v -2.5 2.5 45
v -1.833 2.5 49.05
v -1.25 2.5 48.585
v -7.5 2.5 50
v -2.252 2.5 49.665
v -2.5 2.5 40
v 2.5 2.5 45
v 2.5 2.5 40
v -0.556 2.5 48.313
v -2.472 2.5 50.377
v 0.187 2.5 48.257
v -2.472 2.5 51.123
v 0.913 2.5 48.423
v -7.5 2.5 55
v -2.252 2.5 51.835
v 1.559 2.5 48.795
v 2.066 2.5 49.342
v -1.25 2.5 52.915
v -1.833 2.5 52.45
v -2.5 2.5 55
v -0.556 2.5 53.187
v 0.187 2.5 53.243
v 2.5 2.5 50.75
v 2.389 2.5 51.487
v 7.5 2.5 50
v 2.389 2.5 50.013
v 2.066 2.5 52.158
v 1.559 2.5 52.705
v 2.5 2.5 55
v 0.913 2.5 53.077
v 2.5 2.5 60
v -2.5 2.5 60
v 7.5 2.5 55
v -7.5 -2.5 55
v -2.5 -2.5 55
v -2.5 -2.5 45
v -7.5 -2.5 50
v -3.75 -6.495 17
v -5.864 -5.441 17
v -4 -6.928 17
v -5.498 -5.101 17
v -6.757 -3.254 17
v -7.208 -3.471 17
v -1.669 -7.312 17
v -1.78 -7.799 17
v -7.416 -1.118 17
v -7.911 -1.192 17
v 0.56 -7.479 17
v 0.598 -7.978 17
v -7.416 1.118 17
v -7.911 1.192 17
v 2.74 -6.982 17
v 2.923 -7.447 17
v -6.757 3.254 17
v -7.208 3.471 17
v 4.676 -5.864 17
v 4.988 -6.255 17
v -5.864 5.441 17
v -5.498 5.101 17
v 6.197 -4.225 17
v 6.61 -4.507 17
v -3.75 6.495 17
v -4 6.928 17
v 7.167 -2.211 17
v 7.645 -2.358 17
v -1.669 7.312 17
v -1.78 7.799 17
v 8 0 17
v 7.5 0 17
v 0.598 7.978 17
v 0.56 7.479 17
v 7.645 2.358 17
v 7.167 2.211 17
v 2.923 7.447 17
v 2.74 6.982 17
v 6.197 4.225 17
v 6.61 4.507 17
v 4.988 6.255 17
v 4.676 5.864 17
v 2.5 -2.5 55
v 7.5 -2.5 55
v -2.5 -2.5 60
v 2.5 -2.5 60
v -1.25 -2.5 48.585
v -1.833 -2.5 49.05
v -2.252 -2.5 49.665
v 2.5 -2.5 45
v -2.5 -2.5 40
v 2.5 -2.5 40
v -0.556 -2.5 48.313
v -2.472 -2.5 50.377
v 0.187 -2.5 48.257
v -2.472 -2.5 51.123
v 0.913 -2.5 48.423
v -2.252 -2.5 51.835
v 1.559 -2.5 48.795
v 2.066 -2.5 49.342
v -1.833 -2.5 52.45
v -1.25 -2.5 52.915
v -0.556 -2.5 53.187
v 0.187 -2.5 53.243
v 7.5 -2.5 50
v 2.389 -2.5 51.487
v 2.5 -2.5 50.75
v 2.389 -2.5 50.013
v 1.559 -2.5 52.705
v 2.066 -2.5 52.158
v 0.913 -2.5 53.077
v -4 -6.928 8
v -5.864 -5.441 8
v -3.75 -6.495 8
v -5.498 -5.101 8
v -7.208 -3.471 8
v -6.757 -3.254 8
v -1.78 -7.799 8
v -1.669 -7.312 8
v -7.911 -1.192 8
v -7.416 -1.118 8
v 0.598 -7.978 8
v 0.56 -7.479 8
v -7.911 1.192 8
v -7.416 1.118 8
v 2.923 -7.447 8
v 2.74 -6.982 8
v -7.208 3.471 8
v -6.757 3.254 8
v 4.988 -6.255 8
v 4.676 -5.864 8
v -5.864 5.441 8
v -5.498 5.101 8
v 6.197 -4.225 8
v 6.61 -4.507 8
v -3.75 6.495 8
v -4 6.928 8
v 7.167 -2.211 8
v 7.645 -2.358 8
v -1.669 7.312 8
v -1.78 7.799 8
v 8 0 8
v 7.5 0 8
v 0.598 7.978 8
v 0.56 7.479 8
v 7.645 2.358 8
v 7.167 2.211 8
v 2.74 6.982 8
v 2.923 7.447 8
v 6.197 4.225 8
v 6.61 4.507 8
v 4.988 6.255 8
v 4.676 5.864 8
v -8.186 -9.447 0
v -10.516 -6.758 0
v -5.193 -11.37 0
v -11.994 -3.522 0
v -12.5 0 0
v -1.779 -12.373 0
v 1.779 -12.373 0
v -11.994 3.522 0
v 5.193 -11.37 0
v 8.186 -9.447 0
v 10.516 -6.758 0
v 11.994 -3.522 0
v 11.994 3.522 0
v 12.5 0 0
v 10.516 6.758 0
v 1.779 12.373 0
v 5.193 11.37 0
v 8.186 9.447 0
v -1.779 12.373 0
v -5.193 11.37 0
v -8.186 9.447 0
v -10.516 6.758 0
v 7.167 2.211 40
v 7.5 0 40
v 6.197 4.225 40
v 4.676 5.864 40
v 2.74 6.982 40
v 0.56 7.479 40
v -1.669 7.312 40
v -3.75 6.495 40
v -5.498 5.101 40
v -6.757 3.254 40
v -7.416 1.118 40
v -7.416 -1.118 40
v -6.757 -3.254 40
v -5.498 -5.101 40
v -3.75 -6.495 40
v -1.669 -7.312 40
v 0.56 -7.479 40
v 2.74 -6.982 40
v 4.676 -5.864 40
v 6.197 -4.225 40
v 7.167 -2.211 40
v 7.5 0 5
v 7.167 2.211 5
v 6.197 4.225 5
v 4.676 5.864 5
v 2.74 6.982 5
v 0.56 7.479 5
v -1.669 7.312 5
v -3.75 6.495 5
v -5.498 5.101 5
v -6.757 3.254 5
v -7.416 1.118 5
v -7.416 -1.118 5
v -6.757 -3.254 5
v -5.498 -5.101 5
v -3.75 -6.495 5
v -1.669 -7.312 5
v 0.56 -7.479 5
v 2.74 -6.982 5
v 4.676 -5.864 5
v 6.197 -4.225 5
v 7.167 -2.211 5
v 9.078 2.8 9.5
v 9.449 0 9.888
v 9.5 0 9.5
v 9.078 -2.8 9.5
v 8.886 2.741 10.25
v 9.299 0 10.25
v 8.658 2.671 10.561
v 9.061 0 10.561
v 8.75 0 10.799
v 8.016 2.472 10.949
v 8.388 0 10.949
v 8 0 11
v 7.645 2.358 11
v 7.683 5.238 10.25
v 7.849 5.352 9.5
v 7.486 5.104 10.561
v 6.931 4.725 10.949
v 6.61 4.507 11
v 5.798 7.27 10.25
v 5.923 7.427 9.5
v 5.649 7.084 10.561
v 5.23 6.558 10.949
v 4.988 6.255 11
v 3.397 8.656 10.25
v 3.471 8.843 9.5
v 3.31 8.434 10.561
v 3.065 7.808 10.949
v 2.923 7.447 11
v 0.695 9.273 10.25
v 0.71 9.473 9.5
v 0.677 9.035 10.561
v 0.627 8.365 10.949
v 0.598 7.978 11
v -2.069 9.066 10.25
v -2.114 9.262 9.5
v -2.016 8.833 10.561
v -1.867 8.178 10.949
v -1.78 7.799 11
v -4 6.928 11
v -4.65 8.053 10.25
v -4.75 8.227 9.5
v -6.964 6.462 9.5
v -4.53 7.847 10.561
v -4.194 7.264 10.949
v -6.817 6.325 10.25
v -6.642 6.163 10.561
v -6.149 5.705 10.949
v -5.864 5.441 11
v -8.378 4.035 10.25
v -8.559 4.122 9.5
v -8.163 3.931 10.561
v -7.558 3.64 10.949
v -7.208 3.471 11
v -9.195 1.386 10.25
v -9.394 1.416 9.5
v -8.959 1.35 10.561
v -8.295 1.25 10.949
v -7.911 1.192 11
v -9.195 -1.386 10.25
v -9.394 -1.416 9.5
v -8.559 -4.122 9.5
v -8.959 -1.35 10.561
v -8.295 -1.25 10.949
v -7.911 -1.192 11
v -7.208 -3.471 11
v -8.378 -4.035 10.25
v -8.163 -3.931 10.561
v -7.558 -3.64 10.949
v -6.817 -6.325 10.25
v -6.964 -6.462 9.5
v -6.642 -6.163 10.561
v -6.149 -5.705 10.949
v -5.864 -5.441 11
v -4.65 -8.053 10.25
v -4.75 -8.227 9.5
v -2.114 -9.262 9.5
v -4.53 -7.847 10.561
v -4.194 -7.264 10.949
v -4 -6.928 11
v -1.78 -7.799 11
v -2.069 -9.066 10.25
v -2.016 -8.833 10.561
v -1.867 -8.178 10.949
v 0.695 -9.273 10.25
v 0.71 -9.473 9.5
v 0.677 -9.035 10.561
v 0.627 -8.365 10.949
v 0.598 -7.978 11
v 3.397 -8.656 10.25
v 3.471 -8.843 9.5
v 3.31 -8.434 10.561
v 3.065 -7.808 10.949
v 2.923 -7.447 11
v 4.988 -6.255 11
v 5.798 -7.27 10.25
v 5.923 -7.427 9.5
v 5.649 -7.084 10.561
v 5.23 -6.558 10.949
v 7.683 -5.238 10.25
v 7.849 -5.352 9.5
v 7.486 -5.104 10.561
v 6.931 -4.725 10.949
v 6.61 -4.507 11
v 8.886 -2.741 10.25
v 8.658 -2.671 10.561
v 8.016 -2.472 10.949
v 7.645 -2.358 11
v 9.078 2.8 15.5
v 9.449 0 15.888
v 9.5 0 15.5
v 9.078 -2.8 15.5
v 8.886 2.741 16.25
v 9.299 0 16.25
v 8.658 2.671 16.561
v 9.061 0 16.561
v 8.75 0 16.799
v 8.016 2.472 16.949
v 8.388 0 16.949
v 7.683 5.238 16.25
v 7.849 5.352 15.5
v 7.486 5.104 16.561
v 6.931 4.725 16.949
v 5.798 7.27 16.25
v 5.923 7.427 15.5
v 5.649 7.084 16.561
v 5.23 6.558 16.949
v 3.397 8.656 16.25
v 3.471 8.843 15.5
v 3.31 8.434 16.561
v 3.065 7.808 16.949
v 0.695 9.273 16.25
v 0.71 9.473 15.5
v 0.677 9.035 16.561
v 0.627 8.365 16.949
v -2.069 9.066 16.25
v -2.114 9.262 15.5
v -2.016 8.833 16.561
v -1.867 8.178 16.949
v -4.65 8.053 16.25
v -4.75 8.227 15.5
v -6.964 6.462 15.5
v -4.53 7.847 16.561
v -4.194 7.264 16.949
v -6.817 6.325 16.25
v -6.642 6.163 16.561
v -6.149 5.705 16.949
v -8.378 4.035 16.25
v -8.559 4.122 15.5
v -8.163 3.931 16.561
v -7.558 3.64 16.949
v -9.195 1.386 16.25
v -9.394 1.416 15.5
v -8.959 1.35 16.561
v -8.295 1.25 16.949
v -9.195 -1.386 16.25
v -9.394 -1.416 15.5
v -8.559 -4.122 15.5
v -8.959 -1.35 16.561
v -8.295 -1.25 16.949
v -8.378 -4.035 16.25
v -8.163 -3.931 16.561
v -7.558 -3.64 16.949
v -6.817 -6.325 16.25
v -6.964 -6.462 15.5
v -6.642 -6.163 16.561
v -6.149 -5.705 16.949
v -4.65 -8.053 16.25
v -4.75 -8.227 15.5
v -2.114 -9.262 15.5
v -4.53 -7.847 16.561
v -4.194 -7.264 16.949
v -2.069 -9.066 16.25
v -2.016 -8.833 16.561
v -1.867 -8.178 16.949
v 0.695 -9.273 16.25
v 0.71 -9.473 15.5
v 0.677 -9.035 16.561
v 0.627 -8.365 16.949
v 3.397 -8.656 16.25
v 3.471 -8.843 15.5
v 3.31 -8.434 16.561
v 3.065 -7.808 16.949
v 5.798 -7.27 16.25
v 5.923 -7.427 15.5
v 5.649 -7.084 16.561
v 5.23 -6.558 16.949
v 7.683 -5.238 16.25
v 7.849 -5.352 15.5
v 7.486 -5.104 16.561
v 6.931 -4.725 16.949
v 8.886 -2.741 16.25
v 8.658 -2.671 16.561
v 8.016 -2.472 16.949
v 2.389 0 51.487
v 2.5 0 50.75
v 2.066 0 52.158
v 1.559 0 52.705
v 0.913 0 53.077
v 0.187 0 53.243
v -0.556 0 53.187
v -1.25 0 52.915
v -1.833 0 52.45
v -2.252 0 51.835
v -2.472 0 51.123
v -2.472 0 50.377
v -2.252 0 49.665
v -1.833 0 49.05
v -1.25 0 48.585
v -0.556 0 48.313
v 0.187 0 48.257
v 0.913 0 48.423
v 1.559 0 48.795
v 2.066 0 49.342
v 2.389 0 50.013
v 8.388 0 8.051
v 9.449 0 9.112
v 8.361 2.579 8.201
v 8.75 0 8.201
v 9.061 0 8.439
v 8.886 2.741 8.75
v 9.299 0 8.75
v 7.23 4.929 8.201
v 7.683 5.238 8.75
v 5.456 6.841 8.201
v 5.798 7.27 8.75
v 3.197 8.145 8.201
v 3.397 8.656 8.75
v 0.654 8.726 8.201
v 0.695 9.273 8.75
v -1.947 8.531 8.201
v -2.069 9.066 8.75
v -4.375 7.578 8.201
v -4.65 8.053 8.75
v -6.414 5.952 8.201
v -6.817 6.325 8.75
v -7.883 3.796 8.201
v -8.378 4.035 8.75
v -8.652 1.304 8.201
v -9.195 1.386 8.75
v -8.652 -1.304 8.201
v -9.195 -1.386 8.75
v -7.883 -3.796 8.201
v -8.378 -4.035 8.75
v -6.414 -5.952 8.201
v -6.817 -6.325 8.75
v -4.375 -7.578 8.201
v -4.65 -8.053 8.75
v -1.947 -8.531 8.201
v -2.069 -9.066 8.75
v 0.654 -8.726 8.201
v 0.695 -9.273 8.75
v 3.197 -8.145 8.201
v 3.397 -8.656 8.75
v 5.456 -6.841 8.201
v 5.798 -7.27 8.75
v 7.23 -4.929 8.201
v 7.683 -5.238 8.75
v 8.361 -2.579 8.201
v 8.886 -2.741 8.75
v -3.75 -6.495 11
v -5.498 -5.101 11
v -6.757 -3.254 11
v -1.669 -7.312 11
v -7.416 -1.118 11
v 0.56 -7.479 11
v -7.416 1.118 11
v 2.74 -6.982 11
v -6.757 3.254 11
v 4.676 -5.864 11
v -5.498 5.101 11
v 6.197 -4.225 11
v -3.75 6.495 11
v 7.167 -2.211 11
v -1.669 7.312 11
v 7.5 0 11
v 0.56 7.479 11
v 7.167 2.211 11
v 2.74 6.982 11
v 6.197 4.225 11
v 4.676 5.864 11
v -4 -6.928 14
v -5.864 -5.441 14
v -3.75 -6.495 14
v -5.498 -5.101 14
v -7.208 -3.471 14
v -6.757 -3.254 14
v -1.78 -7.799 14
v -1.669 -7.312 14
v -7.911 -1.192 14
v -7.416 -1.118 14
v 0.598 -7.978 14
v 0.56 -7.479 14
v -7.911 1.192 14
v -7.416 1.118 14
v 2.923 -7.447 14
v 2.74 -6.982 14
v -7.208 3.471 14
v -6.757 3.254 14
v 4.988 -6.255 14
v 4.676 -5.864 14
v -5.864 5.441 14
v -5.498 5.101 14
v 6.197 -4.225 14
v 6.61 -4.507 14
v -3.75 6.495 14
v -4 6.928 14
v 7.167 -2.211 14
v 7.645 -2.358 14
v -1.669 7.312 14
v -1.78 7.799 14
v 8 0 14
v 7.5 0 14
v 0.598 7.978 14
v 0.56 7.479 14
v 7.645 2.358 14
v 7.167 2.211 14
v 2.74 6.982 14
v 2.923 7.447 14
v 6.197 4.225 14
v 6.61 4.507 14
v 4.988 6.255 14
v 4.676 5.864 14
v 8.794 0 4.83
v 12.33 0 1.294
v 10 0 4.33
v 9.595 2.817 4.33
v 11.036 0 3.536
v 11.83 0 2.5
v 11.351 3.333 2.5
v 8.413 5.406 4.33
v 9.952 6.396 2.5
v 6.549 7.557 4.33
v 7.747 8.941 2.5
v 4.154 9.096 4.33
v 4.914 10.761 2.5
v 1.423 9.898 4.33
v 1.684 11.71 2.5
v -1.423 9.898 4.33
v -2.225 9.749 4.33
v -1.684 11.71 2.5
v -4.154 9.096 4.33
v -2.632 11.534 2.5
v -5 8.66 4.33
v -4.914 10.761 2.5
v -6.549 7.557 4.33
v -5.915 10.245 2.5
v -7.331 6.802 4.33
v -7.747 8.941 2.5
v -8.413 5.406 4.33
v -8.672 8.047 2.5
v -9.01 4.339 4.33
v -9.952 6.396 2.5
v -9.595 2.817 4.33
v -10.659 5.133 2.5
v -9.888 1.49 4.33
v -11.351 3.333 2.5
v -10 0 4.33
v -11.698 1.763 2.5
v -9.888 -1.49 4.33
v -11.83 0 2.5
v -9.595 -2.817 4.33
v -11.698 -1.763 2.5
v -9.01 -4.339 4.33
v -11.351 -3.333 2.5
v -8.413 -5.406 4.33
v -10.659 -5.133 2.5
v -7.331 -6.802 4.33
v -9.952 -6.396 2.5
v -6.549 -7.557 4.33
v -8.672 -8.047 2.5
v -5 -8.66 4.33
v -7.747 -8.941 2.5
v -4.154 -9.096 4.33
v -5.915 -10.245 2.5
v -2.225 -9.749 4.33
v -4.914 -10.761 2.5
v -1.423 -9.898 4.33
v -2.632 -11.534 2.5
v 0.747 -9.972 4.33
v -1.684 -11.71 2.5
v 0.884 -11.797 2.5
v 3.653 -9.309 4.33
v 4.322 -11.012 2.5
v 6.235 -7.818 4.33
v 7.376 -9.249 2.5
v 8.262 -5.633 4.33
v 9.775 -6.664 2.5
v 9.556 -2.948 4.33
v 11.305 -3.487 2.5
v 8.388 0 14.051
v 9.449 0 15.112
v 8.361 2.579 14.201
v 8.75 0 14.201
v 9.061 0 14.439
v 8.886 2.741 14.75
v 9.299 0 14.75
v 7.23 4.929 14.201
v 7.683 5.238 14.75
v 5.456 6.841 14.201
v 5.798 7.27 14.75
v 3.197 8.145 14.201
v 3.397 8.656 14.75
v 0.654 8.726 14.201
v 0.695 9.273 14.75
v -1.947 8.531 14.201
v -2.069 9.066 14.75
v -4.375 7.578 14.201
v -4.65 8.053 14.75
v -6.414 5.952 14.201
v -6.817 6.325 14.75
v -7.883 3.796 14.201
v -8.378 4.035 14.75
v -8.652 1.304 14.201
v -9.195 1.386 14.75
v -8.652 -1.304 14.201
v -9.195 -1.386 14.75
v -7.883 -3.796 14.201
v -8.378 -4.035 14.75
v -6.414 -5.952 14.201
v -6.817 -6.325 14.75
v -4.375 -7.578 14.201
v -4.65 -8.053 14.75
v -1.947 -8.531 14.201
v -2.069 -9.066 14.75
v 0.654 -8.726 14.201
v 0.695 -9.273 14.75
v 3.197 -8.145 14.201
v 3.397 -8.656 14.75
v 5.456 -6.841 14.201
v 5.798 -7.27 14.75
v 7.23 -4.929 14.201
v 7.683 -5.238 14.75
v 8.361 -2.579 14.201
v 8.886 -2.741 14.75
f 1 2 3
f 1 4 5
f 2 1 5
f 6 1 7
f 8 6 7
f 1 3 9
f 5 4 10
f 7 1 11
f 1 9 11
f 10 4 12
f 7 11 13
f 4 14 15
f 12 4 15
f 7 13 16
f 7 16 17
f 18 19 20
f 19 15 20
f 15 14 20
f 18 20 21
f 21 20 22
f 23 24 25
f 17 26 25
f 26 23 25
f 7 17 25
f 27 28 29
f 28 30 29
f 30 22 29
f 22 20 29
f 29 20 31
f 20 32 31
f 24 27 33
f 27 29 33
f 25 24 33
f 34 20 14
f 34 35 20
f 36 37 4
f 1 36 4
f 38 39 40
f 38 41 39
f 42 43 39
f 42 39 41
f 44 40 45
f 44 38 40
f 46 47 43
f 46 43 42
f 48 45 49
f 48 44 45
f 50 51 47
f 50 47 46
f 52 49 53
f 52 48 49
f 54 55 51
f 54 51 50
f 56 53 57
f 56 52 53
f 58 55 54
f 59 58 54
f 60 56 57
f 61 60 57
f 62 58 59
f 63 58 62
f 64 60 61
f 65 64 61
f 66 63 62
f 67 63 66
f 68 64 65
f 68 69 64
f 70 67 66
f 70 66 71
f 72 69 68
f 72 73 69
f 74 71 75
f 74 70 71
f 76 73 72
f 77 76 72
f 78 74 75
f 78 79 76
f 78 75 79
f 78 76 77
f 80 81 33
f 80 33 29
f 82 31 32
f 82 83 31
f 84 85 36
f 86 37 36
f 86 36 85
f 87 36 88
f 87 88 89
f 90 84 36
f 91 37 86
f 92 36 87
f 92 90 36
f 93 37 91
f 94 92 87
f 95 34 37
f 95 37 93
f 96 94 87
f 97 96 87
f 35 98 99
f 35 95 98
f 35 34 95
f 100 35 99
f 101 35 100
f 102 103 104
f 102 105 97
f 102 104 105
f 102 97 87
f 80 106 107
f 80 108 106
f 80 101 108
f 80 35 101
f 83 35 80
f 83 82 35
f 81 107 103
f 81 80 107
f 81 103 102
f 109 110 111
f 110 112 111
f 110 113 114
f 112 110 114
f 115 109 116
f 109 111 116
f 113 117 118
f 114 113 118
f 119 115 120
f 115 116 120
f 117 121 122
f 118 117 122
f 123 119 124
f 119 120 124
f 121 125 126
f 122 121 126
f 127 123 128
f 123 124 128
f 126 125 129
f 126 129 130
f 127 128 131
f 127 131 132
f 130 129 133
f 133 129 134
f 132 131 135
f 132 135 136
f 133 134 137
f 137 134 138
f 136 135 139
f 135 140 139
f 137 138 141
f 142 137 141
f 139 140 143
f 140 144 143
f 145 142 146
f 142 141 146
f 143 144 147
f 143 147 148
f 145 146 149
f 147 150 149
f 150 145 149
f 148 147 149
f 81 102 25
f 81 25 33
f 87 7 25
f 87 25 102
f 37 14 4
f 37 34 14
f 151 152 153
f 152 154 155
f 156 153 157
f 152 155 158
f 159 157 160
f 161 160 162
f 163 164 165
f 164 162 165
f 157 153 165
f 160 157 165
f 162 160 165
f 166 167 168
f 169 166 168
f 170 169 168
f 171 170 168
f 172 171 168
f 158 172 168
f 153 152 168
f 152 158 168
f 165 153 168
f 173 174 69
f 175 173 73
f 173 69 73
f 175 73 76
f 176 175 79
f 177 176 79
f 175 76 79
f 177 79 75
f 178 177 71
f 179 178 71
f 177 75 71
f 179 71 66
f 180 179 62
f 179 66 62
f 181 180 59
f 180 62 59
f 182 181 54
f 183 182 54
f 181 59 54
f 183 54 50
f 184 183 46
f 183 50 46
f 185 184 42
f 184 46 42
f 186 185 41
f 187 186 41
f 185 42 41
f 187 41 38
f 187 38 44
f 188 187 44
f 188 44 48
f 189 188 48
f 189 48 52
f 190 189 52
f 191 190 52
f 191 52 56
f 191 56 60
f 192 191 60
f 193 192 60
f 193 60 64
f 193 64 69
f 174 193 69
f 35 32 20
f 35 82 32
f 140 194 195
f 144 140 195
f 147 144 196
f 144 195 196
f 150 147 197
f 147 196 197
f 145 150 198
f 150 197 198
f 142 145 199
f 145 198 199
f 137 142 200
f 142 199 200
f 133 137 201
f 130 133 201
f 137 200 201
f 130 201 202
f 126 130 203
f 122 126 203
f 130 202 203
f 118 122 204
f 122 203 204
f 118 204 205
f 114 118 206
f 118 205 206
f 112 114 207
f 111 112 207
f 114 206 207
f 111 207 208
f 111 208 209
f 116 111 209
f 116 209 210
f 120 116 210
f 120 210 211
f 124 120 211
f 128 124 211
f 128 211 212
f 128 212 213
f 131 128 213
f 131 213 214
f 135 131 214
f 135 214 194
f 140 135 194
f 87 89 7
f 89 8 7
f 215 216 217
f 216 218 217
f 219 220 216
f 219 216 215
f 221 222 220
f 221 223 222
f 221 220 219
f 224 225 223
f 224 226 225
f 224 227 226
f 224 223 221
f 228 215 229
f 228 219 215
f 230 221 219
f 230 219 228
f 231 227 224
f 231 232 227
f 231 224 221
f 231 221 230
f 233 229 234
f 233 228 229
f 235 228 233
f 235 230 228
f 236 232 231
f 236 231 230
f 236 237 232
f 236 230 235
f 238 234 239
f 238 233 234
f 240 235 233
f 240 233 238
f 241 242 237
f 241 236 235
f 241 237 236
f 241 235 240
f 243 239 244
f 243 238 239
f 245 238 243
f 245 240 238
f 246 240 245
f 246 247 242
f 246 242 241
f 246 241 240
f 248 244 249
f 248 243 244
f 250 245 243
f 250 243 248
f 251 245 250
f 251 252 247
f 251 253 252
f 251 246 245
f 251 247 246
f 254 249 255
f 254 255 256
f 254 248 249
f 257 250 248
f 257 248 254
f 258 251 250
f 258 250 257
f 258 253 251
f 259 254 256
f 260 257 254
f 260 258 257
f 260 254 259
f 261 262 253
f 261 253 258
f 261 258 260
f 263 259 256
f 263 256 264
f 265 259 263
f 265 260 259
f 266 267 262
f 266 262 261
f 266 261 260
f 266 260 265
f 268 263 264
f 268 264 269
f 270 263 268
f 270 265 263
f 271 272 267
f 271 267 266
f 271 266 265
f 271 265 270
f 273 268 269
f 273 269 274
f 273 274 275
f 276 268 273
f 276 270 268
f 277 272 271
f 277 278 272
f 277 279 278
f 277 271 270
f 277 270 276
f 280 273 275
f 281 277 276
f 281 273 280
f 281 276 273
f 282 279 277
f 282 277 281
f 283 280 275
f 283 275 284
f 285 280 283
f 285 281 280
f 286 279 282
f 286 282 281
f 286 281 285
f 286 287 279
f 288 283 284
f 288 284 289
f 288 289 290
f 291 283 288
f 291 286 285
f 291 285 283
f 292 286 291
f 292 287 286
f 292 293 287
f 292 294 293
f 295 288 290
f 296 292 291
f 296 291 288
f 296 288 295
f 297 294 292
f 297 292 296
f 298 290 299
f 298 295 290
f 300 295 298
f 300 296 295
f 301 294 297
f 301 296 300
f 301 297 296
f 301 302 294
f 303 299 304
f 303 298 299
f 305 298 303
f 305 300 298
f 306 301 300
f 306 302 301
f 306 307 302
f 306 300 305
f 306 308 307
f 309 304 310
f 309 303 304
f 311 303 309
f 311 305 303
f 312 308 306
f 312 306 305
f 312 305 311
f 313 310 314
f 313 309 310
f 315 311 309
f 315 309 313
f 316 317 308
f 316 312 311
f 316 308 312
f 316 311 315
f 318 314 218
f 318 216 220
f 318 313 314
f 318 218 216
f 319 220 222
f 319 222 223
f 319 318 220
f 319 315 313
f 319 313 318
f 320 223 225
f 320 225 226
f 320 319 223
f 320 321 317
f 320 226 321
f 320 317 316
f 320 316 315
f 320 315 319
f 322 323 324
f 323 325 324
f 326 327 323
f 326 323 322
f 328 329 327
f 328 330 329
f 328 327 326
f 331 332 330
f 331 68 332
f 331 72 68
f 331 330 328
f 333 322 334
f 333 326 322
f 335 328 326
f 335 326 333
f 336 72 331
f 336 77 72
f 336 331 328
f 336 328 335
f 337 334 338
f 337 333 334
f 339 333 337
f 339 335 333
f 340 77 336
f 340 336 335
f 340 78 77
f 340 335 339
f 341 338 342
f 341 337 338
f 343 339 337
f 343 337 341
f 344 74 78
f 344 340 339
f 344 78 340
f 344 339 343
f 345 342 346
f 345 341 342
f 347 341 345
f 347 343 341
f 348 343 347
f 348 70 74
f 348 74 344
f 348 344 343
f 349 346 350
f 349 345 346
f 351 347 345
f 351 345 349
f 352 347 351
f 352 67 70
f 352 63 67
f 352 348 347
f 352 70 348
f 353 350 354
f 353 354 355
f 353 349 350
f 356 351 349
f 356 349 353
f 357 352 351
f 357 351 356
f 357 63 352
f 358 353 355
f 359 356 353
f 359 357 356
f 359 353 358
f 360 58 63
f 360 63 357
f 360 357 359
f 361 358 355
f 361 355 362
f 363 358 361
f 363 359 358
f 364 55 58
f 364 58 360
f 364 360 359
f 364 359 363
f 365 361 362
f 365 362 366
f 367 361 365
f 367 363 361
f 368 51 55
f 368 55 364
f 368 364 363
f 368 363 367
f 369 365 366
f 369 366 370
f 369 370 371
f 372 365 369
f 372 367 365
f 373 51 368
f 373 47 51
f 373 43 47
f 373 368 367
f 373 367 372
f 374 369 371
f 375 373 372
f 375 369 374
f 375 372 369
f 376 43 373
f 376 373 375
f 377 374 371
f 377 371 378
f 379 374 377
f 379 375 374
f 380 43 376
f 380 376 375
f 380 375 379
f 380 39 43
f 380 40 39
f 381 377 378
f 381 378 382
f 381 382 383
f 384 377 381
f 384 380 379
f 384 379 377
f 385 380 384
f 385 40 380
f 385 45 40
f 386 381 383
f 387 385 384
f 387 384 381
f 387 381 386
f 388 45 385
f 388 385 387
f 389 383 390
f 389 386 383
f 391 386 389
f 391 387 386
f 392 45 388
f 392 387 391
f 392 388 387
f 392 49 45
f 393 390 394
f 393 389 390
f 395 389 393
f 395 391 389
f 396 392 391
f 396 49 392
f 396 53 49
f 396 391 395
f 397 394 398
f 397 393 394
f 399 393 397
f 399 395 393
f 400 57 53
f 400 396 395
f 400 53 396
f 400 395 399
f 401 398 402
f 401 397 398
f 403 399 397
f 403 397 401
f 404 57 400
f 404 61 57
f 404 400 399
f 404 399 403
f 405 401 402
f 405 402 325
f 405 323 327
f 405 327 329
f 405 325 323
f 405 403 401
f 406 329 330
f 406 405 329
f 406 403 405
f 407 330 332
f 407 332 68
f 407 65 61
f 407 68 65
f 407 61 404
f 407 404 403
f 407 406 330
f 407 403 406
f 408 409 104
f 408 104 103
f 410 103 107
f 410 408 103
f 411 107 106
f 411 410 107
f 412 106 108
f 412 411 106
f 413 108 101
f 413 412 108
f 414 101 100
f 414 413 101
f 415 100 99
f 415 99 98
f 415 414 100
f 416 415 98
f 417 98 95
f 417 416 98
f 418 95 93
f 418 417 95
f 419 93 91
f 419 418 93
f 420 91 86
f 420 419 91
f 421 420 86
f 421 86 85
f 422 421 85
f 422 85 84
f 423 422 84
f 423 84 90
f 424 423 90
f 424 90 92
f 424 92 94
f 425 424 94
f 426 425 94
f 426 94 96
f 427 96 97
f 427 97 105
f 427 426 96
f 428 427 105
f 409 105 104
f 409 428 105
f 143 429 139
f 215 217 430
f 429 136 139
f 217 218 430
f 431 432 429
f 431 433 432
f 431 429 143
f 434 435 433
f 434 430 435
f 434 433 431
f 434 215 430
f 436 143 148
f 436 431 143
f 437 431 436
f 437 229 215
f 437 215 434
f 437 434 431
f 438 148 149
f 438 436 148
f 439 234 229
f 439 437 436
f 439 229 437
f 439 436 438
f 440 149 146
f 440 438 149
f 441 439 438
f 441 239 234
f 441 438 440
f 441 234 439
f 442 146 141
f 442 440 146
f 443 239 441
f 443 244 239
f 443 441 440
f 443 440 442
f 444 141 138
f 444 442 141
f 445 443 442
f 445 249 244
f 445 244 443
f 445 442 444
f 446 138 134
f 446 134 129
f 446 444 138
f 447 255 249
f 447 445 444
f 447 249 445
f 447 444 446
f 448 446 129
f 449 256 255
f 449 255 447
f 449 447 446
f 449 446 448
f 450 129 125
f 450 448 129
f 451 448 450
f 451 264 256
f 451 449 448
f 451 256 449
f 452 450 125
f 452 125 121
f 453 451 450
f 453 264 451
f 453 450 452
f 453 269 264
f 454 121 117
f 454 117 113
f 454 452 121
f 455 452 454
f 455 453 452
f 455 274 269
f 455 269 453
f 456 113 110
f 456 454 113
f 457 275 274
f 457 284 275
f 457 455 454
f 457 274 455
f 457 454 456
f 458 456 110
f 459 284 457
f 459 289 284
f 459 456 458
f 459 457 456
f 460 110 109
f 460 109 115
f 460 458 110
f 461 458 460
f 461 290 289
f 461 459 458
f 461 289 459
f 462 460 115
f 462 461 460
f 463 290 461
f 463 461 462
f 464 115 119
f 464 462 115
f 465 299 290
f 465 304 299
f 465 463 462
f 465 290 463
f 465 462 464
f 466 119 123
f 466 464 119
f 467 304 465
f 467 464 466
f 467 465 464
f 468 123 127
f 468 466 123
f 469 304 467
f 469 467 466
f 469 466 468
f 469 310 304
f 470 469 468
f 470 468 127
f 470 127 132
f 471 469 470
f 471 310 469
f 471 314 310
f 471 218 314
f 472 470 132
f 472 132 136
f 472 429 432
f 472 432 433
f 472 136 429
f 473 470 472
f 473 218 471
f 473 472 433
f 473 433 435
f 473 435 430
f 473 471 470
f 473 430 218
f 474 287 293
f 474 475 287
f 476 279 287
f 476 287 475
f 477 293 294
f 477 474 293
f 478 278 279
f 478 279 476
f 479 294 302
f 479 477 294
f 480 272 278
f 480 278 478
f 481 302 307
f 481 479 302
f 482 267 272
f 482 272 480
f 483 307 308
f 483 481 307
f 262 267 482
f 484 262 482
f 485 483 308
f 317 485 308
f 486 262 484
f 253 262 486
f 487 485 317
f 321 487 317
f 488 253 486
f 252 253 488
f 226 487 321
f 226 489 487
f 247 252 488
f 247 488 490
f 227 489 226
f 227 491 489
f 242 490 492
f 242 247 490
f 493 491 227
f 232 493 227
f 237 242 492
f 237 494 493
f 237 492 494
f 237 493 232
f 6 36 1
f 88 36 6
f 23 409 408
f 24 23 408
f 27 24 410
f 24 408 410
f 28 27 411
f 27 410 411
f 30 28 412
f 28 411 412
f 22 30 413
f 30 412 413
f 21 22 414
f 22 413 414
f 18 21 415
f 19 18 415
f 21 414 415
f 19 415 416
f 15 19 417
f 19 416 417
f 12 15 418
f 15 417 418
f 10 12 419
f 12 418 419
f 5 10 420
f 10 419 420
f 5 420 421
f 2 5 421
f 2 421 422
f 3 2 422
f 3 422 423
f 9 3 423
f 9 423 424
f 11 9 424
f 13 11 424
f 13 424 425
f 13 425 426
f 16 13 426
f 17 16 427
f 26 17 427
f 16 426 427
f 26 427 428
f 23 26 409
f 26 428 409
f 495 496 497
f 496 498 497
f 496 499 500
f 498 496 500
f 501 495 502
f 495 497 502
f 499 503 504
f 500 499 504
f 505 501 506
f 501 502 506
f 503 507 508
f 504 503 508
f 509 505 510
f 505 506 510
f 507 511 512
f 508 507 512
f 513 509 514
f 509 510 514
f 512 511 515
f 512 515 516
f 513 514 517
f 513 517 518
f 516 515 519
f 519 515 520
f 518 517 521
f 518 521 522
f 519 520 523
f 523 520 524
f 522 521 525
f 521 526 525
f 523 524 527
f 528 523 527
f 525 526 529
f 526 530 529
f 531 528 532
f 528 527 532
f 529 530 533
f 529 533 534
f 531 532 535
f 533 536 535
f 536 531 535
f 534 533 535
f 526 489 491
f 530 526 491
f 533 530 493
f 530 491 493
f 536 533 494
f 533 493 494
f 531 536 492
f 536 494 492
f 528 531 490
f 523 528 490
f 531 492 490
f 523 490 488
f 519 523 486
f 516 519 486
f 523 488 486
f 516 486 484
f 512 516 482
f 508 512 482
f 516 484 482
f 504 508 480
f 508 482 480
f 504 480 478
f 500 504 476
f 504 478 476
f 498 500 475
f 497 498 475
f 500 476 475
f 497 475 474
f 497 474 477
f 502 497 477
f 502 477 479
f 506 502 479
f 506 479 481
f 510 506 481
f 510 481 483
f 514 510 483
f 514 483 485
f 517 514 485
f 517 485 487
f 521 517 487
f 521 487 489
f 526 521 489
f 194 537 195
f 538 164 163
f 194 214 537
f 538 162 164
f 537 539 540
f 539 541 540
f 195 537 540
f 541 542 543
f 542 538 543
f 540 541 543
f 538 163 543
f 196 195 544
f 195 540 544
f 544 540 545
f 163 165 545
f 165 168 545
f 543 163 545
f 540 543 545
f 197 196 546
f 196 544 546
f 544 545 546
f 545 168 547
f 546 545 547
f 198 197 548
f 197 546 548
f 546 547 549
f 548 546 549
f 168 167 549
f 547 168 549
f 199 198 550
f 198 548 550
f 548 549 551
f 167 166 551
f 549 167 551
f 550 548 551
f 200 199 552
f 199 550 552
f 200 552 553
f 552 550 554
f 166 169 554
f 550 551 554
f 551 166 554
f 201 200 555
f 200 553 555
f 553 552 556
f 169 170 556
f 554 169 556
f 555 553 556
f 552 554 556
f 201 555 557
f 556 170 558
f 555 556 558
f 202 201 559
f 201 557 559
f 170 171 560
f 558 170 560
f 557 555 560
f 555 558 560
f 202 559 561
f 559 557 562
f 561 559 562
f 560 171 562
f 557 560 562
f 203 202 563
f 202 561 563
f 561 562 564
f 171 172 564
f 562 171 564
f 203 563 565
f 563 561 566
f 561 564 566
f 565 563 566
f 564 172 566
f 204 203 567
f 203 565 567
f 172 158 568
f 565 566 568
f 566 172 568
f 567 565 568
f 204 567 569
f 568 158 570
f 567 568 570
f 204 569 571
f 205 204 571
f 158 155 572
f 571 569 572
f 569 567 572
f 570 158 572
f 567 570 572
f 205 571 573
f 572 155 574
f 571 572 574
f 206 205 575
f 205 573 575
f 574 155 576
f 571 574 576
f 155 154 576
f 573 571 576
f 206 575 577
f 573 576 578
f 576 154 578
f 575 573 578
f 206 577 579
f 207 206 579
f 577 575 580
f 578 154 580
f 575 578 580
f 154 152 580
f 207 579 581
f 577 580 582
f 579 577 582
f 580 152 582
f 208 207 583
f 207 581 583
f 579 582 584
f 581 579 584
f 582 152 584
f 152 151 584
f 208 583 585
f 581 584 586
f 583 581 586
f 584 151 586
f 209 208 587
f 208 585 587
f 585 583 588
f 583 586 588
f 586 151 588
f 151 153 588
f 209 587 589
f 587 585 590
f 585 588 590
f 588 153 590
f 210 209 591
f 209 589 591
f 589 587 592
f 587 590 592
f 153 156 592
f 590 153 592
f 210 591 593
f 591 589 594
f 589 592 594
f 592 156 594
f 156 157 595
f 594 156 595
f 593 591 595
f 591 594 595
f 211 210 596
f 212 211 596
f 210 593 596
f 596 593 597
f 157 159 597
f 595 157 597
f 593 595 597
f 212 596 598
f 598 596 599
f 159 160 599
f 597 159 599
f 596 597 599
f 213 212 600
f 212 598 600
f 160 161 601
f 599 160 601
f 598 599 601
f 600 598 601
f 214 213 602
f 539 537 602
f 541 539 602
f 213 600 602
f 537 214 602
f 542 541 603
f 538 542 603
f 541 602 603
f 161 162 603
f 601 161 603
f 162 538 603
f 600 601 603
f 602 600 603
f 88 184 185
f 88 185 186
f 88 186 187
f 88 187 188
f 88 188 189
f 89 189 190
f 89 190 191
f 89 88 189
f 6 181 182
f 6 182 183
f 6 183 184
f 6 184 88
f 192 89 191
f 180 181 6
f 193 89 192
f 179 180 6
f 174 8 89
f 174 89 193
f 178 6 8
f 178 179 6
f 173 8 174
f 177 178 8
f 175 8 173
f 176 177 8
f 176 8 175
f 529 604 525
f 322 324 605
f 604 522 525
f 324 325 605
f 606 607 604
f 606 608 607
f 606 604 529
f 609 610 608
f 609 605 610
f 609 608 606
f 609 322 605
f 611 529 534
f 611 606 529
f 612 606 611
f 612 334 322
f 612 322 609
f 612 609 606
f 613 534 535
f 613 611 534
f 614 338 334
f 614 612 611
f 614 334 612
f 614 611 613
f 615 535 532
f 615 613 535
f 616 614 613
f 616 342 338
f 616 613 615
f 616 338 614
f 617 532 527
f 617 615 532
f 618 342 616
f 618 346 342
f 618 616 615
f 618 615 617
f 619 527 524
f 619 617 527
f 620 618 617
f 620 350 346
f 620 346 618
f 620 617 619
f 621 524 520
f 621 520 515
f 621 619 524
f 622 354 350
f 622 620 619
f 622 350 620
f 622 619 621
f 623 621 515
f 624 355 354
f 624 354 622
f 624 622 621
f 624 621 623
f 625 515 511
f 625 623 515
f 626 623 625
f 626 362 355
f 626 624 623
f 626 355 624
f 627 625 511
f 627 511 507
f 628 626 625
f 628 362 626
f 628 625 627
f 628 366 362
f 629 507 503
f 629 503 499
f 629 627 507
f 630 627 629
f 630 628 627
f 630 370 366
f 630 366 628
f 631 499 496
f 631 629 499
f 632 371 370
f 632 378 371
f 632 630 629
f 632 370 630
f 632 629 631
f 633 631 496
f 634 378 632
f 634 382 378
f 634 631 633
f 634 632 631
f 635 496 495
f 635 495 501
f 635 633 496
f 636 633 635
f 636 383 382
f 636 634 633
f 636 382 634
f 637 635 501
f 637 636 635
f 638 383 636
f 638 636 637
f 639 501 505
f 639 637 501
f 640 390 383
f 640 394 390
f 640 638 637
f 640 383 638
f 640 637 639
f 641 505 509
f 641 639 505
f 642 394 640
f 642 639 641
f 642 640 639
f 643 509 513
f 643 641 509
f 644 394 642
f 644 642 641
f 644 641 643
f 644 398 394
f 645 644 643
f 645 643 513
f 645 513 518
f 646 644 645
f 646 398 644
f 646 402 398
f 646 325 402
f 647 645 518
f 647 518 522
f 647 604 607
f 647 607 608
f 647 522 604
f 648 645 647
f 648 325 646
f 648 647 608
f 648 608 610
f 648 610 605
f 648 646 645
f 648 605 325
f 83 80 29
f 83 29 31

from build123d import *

# Parameters (mm, degrees)
F3_R           = 12.5
F3_R_2         = 9.5
F3_R_3         = 7.5
F4_DEPTH       = 5
F5_DEPTH       = 40
F6_START       = 8
F6_DEPTH       = 3
F7_START       = 14
F7_DEPTH       = 3
F8_R           = 1.49999
F9_R           = 1.49999
F10_R          = 4.99999
F14_R          = 2.5
F15_DEPTH      = 2.5
F15_DEPTH_BACK = 2.5
F16_SIZE       = 4.99999


# Not quite as in the source:
# - a fillet or chamfer is up to 0.001 mm smaller than in the source, because OpenCascade refuses the exact size


with BuildPart() as f4:
    # F3 (on Top) → F4 (new body)
    with BuildSketch(Plane.XY):
        Circle(F3_R)
        Circle(F3_R_2, mode=Mode.SUBTRACT)
        Circle(F3_R_2)
        Circle(F3_R_3, mode=Mode.SUBTRACT)
        Circle(F3_R_3)
    extrude(amount=F4_DEPTH)

    # F3 (on Top) → F5 (join)
    with BuildSketch(Plane.XY):
        Circle(F3_R_3)
    extrude(amount=F5_DEPTH)

    # F3 (on Top) → F6 (join)
    with BuildSketch(Plane.XY.offset(F6_START)):
        Circle(F3_R_2)
        Circle(F3_R_3, mode=Mode.SUBTRACT)
    extrude(amount=F6_DEPTH)

    # F3 (on Top) → F7 (join)
    with BuildSketch(Plane.XY.offset(F7_START)):
        Circle(F3_R_2)
        Circle(F3_R_3, mode=Mode.SUBTRACT)
    extrude(amount=F7_DEPTH)

    # F8 (radius 1.5 in the source; OpenCascade refuses exactly that, so slightly less here)
    f8_edges = [f4.edges().sort_by_distance(p)[0] for p in [
        (-9.5, 0, 8),
        (-9.5, 0, 11),
    ]]
    fillet(f8_edges, radius=F8_R)

    # F9 (radius 1.5 in the source; OpenCascade refuses exactly that, so slightly less here)
    f9_edges = [f4.edges().sort_by_distance(p)[0] for p in [
        (-9.5, 0, 14),
        (-9.5, 0, 17),
    ]]
    fillet(f9_edges, radius=F9_R)

    # F10 (radius 5 in the source; OpenCascade refuses exactly that, so slightly less here)
    f10_edges = [f4.edges().sort_by_distance(p)[0] for p in [
        (-12.5, 0, 5),
    ]]
    fillet(f10_edges, radius=F10_R)

    # F14 (on Front) → F15 (join, two sides)
    with BuildSketch(Plane.XZ) as f15_sk:
        Polygon((-2.5, 50), (-2.5, 40), (2.5, 40), (2.5, 50), (7.5, 50), (7.5, 55), (2.5, 55), (2.5, 60), (-2.5, 60), (-2.5, 55), (-7.5, 55), (-7.5, 50), align=None)
        with Locations((0, 50.75)):
            Circle(F14_R, mode=Mode.SUBTRACT)
    extrude(amount=F15_DEPTH)
    extrude(f15_sk.sketch, amount=-F15_DEPTH_BACK)

    # F16 (size 5 in the source; OpenCascade refuses exactly that, so slightly less here)
    f16_edges = [f4.edges().sort_by_distance(p)[0] for p in [
        (-2.5, 0, 50),
        (2.5, 0, 50),
    ]]
    chamfer(f16_edges, length=F16_SIZE)


solid = f4.part
